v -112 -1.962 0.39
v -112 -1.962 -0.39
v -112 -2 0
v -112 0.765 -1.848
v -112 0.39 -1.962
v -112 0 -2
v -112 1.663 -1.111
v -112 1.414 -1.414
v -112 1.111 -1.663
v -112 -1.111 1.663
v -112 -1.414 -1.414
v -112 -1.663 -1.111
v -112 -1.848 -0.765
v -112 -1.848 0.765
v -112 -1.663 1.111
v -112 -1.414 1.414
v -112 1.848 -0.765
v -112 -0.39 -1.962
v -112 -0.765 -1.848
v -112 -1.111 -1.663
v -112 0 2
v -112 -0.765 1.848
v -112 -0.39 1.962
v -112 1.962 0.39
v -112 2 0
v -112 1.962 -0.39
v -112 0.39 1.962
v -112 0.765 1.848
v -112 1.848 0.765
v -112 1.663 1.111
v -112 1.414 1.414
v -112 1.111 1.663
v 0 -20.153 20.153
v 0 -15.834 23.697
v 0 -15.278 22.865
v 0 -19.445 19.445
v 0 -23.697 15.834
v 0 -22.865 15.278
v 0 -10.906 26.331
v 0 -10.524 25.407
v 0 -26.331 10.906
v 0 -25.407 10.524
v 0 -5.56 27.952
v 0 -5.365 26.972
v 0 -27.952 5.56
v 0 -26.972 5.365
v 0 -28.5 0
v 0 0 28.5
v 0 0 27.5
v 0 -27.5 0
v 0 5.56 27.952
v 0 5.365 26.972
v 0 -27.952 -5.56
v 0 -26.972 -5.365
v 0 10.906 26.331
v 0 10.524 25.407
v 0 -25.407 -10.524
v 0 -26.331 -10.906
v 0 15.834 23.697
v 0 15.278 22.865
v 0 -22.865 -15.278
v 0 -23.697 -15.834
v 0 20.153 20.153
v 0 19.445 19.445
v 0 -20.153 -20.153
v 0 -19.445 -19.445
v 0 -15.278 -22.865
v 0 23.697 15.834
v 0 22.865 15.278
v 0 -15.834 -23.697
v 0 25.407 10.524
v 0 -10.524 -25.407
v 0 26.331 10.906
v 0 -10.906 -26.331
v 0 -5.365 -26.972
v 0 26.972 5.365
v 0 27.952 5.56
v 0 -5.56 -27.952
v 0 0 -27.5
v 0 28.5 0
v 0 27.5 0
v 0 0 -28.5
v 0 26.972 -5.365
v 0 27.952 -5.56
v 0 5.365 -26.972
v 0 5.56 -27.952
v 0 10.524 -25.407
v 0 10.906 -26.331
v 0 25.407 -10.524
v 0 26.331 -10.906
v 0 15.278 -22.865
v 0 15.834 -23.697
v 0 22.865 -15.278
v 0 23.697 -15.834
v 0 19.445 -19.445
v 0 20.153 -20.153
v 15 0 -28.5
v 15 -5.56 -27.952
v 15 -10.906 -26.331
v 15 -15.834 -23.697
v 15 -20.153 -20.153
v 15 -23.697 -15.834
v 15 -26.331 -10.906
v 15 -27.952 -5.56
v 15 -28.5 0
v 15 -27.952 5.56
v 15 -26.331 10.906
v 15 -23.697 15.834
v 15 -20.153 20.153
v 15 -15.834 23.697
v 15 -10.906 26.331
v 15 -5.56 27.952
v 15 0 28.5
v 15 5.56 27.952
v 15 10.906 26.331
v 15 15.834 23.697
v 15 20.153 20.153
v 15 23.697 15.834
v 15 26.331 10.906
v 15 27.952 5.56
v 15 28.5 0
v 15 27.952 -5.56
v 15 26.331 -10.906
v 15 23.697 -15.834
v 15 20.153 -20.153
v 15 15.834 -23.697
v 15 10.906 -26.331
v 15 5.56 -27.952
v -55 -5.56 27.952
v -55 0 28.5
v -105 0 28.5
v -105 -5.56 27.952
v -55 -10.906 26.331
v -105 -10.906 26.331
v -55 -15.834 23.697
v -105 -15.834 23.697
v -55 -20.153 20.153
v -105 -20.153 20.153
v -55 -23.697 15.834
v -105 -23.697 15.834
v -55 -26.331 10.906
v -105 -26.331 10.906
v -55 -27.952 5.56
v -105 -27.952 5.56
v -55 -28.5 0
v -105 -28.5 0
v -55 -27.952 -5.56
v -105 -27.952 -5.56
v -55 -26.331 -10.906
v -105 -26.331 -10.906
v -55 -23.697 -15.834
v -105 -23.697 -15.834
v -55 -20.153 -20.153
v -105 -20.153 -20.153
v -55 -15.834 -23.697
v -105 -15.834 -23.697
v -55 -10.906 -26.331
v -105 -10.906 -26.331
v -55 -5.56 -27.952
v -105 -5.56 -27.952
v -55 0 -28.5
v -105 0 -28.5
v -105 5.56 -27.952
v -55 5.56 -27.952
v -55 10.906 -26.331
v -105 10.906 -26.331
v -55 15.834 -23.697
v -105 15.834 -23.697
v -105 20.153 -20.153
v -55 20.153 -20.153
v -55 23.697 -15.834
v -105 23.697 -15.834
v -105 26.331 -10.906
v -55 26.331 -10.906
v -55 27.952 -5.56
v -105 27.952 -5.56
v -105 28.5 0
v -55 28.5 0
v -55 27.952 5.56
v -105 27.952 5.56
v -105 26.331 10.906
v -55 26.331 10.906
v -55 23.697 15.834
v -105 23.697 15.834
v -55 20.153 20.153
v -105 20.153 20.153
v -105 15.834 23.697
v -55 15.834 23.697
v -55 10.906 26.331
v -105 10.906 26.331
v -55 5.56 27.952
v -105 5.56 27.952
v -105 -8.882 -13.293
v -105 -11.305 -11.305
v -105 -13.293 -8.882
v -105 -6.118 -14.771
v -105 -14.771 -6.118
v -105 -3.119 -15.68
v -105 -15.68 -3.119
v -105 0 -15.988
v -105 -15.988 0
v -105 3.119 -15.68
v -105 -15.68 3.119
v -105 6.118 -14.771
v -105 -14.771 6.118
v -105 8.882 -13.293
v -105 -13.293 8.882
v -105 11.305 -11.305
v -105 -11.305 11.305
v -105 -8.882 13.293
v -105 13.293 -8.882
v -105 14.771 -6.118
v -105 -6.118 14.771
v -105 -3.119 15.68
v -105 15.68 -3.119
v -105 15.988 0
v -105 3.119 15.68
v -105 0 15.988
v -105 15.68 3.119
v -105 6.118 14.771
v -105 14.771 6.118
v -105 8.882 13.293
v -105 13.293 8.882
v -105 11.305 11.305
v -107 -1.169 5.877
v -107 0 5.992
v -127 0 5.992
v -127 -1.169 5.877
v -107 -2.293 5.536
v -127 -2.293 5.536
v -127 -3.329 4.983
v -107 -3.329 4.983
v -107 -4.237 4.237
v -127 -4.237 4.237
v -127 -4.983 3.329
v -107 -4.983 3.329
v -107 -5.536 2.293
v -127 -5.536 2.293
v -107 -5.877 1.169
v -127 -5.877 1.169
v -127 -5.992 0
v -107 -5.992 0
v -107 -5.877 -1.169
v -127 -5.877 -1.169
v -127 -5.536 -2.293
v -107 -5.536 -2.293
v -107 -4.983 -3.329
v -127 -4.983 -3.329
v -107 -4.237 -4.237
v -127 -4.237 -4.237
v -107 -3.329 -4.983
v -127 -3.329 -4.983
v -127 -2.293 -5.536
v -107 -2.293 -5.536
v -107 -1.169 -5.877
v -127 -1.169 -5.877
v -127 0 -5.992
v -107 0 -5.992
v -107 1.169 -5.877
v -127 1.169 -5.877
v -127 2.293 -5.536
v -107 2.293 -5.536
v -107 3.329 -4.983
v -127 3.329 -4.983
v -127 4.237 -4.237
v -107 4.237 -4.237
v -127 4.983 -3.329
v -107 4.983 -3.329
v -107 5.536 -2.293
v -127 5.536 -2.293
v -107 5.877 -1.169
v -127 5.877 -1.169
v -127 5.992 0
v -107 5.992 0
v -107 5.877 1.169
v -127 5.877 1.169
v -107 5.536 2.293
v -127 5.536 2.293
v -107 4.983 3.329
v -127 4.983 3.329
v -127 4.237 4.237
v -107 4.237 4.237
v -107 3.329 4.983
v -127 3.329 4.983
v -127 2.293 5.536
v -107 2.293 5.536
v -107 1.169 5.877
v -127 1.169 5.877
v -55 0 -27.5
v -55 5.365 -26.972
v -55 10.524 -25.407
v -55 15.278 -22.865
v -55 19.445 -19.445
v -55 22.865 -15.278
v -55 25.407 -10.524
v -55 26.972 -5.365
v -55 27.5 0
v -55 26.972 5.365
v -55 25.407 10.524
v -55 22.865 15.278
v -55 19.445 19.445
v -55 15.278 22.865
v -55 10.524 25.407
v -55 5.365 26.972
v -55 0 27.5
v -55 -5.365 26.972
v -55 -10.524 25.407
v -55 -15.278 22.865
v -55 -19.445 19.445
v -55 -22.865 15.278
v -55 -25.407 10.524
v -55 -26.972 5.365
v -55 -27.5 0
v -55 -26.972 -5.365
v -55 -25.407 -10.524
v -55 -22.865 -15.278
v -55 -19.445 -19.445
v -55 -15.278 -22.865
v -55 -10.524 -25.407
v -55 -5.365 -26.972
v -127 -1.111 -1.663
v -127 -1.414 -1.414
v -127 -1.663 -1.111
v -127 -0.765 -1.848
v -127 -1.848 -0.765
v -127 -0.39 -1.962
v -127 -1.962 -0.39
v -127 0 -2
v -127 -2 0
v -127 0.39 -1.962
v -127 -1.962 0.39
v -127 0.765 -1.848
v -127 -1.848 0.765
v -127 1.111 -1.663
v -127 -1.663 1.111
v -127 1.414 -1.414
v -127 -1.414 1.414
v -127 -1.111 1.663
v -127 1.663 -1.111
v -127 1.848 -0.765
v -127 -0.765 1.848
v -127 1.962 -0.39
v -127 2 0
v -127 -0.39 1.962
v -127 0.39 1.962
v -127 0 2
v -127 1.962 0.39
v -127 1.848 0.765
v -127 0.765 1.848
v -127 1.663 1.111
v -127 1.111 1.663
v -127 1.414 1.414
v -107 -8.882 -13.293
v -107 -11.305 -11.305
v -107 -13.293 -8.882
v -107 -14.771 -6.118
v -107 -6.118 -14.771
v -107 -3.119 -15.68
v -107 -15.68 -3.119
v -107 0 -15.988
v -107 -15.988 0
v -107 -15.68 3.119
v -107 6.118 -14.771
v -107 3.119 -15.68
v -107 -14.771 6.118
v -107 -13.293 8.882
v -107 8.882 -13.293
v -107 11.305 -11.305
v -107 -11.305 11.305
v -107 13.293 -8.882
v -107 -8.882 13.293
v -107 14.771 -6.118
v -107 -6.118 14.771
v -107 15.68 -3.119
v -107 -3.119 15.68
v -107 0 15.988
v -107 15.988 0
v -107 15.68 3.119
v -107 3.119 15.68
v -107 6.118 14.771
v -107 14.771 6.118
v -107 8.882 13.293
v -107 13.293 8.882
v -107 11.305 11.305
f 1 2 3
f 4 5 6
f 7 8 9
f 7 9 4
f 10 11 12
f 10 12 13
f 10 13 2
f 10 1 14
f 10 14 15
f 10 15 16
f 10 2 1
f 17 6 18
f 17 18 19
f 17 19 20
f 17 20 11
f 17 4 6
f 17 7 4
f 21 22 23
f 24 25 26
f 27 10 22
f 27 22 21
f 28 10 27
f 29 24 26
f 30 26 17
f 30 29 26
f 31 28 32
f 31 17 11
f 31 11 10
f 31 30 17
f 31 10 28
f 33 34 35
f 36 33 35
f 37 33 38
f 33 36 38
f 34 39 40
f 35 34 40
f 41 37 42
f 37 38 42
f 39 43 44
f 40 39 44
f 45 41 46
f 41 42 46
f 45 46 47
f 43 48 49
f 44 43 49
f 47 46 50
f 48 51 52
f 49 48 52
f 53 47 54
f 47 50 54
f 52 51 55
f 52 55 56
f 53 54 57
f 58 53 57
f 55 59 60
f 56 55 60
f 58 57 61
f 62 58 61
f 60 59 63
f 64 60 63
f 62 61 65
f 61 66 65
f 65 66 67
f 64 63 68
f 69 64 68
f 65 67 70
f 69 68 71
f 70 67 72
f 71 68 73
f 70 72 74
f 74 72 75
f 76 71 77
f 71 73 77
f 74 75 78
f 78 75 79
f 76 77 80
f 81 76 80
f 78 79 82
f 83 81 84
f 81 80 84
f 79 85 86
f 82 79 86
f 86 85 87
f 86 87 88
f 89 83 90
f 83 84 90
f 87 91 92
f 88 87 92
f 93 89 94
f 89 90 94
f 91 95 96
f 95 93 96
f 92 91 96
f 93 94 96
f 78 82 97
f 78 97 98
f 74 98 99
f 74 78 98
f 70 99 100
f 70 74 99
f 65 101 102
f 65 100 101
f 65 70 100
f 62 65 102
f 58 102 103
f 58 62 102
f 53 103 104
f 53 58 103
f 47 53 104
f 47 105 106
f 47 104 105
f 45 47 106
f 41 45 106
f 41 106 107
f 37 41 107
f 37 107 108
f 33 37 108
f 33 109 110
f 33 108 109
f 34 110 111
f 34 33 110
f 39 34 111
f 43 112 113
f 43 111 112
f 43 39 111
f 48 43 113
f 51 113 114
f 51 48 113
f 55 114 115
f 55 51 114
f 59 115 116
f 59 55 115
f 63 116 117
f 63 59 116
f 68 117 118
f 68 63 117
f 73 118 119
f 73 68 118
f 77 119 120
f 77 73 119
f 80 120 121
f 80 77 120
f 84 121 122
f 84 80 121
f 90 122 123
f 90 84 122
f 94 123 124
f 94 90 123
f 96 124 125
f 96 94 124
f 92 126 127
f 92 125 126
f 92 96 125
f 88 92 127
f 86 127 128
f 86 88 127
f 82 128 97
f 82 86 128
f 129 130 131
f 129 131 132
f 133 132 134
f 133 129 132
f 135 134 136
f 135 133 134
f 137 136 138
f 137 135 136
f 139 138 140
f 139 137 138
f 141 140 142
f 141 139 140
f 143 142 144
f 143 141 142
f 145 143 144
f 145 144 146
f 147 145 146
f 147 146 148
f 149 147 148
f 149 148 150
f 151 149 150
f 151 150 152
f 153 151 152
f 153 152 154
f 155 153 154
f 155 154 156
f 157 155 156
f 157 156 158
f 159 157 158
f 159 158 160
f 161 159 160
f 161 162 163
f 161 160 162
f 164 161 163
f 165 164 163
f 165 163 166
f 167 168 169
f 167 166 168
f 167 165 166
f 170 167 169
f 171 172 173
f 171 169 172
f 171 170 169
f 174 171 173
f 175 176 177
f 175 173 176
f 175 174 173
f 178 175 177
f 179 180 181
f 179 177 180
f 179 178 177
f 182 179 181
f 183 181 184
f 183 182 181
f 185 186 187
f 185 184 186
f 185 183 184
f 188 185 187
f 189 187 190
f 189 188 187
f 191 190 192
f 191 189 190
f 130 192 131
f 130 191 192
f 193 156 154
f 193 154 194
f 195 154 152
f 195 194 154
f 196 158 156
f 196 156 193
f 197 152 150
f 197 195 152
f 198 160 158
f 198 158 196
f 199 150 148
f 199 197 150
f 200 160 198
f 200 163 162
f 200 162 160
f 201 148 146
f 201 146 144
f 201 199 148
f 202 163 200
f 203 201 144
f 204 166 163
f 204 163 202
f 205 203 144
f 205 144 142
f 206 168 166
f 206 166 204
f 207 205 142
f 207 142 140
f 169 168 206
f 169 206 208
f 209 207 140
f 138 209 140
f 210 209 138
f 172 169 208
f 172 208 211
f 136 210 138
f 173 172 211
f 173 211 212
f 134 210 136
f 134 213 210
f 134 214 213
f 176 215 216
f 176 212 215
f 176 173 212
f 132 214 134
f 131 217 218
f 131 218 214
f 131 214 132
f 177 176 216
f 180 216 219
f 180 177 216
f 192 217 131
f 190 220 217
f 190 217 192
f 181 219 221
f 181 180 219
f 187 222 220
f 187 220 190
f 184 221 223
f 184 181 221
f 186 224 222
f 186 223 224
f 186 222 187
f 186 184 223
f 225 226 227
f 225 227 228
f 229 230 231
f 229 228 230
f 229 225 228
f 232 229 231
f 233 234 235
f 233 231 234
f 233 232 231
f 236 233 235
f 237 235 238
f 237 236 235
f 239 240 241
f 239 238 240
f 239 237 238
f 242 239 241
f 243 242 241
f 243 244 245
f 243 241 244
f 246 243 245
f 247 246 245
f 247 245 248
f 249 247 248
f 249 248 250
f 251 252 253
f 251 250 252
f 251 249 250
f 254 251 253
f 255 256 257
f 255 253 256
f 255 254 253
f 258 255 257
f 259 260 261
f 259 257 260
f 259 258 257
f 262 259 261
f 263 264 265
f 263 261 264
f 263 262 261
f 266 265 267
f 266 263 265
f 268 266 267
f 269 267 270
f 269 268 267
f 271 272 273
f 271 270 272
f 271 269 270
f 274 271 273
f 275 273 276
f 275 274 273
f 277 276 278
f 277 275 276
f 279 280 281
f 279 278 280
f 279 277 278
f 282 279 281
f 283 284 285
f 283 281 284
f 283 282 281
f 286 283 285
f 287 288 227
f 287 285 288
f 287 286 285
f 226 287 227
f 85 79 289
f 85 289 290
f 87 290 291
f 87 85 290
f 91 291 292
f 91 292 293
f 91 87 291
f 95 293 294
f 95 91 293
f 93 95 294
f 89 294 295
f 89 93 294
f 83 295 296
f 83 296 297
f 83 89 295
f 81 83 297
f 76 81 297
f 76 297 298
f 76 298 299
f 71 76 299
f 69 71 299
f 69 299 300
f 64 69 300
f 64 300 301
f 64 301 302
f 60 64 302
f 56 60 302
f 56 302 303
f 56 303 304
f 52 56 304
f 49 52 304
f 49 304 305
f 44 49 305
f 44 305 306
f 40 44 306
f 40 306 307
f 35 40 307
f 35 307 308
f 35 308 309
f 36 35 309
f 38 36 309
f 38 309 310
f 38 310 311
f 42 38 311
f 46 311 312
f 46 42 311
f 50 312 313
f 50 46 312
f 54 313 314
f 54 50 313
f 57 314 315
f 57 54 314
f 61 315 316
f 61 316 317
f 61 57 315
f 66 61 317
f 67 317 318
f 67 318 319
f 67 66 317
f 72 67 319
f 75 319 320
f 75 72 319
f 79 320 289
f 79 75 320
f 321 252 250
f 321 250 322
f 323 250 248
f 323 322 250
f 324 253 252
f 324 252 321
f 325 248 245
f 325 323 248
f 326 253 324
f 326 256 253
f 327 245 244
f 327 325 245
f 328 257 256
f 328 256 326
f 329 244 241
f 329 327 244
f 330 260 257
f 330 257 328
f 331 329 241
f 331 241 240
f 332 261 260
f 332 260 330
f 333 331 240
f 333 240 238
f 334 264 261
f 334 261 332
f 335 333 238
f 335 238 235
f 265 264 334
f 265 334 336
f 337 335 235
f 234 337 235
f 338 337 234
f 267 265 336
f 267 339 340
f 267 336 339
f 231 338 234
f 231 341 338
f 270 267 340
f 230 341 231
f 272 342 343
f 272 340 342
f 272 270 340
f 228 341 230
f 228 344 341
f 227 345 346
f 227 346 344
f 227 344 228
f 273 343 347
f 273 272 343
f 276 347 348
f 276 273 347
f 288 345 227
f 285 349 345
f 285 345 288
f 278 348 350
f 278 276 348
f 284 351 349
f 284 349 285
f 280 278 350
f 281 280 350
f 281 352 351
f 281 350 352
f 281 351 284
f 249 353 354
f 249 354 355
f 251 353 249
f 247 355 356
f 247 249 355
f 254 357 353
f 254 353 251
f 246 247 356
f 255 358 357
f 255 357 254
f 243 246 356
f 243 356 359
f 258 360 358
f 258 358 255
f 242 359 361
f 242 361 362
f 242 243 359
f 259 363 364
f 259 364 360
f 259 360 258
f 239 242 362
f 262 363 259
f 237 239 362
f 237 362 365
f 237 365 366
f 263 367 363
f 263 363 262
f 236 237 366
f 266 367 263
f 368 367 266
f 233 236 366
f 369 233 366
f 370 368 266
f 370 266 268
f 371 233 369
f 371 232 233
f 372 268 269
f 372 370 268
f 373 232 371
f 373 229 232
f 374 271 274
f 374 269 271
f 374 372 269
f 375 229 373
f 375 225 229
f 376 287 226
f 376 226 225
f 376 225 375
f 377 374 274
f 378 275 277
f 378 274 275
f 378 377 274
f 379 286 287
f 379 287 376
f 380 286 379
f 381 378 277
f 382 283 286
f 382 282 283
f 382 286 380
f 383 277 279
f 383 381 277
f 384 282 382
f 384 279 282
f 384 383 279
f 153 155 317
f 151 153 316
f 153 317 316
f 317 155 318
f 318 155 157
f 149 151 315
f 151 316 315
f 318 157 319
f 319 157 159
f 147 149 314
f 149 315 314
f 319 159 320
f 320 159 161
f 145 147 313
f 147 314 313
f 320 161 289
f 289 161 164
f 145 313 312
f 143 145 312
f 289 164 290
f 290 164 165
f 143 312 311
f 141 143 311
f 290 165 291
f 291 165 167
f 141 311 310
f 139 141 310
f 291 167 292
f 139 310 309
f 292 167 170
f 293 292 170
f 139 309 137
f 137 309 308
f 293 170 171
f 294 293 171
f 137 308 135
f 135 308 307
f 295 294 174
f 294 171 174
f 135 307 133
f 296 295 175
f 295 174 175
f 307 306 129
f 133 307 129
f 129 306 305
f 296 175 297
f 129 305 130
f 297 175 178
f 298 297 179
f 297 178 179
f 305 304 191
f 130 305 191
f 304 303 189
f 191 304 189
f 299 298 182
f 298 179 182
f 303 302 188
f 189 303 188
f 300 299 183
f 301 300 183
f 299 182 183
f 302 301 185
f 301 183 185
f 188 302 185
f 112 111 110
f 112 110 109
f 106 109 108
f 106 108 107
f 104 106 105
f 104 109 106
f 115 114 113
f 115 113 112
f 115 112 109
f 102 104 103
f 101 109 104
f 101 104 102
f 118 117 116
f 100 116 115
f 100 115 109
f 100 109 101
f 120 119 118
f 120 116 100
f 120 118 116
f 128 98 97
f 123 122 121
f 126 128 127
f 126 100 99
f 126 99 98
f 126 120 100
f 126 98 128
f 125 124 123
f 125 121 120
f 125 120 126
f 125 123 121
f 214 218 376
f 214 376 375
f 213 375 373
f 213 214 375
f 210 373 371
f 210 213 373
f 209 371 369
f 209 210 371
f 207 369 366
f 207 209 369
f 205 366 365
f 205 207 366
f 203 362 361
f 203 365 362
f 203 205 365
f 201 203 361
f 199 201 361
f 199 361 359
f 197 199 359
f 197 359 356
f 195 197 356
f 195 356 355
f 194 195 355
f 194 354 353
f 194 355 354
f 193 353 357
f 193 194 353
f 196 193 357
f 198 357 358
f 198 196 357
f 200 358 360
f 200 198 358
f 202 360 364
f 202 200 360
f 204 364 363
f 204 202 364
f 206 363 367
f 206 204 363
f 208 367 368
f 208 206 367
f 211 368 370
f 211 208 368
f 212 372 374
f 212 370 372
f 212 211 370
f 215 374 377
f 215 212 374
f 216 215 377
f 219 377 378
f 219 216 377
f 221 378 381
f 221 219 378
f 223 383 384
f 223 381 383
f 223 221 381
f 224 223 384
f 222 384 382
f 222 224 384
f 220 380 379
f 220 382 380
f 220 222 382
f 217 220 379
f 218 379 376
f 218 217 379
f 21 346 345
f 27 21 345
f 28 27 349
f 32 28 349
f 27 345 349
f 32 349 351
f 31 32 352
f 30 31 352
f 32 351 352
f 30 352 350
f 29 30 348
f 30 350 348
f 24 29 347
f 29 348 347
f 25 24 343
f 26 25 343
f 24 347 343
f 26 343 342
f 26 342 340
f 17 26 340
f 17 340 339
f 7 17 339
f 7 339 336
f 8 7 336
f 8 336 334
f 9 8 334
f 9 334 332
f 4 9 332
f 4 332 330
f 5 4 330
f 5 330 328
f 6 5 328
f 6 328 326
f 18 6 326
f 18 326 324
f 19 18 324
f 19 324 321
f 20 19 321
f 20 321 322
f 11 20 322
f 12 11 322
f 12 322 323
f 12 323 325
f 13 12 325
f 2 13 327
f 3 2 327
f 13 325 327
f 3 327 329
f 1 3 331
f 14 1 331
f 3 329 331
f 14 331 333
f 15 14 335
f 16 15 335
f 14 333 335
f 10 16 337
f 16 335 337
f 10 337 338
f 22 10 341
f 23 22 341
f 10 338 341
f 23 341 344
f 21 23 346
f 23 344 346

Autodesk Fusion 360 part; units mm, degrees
sketch "Sketch1" plane through (0, 0, 0) normal (1, 0, 0) x (0, 0, -1)
  circle A0 centre (0, 0) radius 28.5
  dimension "d1" = 57
extrude "Extrude1" add sketch "Sketch1" along normal blind 15
sketch "Sketch2" plane through (0, 0, 0) normal (1, 0, 0) x (0, 0, -1)
  circle A0 centre (0, 0) radius 27.5
  dimension "d4" = 55
extrude "Extrude2" add sketch "Sketch2" against normal blind 55
sketch "Sketch3" plane through (-55, 0, 0) normal (-1, 0, 0) x (0, 0, 1)
  circle A0 centre (0, 0) radius 27.5
  circle A1 centre (0, 0) radius 28.5
extrude "Extrude3" add sketch "Sketch3" along normal blind 5 contours A0 | A1
sketch "Sketch4" plane through (-60, 0, 0) normal (-1, 0, 0) x (0, 0, 1)
  circle A0 centre (0, 0) radius 28.5
  circle A1 centre (0, 0) radius 28.5
extrude "Extrude4" add sketch "Sketch4" along normal blind 45
sketch "Sketch5" plane through (-105, 0, 0) normal (-1, 0, 0) x (0, 0, 1)
  circle A0 centre (0, 0) radius 28.5
  circle A1 centre (0, 0) radius 15.9875
  dimension "d11" = 31.975
extrude "Extrude5" add sketch "Sketch5" along normal blind 2 contours A1
sketch "Sketch6" plane through (-107, 0, 0) normal (-1, 0, 0) x (0, 0, 1)
  circle A0 centre (0, 0) radius 15.9875
  circle A1 centre (0, 0) radius 5.9925
  dimension "d14" = 11.985
extrude "Extrude6" add sketch "Sketch6" along normal blind 20 contours A1
sketch "Sketch7" plane through (-127, 0, 0) normal (-1, 0, 0) x (0, 0, 1)
  circle A0 centre (0, 0) radius 5.9925
  circle A1 centre (0, 0) radius 2
  dimension "d17" = 4
extrude "Extrude7" cut sketch "Sketch7" against normal blind 15 contours A1
equation "d11 = 32 mm - 0.025 mm"
equation "d14 = 12 mm - 0.015 mm"
